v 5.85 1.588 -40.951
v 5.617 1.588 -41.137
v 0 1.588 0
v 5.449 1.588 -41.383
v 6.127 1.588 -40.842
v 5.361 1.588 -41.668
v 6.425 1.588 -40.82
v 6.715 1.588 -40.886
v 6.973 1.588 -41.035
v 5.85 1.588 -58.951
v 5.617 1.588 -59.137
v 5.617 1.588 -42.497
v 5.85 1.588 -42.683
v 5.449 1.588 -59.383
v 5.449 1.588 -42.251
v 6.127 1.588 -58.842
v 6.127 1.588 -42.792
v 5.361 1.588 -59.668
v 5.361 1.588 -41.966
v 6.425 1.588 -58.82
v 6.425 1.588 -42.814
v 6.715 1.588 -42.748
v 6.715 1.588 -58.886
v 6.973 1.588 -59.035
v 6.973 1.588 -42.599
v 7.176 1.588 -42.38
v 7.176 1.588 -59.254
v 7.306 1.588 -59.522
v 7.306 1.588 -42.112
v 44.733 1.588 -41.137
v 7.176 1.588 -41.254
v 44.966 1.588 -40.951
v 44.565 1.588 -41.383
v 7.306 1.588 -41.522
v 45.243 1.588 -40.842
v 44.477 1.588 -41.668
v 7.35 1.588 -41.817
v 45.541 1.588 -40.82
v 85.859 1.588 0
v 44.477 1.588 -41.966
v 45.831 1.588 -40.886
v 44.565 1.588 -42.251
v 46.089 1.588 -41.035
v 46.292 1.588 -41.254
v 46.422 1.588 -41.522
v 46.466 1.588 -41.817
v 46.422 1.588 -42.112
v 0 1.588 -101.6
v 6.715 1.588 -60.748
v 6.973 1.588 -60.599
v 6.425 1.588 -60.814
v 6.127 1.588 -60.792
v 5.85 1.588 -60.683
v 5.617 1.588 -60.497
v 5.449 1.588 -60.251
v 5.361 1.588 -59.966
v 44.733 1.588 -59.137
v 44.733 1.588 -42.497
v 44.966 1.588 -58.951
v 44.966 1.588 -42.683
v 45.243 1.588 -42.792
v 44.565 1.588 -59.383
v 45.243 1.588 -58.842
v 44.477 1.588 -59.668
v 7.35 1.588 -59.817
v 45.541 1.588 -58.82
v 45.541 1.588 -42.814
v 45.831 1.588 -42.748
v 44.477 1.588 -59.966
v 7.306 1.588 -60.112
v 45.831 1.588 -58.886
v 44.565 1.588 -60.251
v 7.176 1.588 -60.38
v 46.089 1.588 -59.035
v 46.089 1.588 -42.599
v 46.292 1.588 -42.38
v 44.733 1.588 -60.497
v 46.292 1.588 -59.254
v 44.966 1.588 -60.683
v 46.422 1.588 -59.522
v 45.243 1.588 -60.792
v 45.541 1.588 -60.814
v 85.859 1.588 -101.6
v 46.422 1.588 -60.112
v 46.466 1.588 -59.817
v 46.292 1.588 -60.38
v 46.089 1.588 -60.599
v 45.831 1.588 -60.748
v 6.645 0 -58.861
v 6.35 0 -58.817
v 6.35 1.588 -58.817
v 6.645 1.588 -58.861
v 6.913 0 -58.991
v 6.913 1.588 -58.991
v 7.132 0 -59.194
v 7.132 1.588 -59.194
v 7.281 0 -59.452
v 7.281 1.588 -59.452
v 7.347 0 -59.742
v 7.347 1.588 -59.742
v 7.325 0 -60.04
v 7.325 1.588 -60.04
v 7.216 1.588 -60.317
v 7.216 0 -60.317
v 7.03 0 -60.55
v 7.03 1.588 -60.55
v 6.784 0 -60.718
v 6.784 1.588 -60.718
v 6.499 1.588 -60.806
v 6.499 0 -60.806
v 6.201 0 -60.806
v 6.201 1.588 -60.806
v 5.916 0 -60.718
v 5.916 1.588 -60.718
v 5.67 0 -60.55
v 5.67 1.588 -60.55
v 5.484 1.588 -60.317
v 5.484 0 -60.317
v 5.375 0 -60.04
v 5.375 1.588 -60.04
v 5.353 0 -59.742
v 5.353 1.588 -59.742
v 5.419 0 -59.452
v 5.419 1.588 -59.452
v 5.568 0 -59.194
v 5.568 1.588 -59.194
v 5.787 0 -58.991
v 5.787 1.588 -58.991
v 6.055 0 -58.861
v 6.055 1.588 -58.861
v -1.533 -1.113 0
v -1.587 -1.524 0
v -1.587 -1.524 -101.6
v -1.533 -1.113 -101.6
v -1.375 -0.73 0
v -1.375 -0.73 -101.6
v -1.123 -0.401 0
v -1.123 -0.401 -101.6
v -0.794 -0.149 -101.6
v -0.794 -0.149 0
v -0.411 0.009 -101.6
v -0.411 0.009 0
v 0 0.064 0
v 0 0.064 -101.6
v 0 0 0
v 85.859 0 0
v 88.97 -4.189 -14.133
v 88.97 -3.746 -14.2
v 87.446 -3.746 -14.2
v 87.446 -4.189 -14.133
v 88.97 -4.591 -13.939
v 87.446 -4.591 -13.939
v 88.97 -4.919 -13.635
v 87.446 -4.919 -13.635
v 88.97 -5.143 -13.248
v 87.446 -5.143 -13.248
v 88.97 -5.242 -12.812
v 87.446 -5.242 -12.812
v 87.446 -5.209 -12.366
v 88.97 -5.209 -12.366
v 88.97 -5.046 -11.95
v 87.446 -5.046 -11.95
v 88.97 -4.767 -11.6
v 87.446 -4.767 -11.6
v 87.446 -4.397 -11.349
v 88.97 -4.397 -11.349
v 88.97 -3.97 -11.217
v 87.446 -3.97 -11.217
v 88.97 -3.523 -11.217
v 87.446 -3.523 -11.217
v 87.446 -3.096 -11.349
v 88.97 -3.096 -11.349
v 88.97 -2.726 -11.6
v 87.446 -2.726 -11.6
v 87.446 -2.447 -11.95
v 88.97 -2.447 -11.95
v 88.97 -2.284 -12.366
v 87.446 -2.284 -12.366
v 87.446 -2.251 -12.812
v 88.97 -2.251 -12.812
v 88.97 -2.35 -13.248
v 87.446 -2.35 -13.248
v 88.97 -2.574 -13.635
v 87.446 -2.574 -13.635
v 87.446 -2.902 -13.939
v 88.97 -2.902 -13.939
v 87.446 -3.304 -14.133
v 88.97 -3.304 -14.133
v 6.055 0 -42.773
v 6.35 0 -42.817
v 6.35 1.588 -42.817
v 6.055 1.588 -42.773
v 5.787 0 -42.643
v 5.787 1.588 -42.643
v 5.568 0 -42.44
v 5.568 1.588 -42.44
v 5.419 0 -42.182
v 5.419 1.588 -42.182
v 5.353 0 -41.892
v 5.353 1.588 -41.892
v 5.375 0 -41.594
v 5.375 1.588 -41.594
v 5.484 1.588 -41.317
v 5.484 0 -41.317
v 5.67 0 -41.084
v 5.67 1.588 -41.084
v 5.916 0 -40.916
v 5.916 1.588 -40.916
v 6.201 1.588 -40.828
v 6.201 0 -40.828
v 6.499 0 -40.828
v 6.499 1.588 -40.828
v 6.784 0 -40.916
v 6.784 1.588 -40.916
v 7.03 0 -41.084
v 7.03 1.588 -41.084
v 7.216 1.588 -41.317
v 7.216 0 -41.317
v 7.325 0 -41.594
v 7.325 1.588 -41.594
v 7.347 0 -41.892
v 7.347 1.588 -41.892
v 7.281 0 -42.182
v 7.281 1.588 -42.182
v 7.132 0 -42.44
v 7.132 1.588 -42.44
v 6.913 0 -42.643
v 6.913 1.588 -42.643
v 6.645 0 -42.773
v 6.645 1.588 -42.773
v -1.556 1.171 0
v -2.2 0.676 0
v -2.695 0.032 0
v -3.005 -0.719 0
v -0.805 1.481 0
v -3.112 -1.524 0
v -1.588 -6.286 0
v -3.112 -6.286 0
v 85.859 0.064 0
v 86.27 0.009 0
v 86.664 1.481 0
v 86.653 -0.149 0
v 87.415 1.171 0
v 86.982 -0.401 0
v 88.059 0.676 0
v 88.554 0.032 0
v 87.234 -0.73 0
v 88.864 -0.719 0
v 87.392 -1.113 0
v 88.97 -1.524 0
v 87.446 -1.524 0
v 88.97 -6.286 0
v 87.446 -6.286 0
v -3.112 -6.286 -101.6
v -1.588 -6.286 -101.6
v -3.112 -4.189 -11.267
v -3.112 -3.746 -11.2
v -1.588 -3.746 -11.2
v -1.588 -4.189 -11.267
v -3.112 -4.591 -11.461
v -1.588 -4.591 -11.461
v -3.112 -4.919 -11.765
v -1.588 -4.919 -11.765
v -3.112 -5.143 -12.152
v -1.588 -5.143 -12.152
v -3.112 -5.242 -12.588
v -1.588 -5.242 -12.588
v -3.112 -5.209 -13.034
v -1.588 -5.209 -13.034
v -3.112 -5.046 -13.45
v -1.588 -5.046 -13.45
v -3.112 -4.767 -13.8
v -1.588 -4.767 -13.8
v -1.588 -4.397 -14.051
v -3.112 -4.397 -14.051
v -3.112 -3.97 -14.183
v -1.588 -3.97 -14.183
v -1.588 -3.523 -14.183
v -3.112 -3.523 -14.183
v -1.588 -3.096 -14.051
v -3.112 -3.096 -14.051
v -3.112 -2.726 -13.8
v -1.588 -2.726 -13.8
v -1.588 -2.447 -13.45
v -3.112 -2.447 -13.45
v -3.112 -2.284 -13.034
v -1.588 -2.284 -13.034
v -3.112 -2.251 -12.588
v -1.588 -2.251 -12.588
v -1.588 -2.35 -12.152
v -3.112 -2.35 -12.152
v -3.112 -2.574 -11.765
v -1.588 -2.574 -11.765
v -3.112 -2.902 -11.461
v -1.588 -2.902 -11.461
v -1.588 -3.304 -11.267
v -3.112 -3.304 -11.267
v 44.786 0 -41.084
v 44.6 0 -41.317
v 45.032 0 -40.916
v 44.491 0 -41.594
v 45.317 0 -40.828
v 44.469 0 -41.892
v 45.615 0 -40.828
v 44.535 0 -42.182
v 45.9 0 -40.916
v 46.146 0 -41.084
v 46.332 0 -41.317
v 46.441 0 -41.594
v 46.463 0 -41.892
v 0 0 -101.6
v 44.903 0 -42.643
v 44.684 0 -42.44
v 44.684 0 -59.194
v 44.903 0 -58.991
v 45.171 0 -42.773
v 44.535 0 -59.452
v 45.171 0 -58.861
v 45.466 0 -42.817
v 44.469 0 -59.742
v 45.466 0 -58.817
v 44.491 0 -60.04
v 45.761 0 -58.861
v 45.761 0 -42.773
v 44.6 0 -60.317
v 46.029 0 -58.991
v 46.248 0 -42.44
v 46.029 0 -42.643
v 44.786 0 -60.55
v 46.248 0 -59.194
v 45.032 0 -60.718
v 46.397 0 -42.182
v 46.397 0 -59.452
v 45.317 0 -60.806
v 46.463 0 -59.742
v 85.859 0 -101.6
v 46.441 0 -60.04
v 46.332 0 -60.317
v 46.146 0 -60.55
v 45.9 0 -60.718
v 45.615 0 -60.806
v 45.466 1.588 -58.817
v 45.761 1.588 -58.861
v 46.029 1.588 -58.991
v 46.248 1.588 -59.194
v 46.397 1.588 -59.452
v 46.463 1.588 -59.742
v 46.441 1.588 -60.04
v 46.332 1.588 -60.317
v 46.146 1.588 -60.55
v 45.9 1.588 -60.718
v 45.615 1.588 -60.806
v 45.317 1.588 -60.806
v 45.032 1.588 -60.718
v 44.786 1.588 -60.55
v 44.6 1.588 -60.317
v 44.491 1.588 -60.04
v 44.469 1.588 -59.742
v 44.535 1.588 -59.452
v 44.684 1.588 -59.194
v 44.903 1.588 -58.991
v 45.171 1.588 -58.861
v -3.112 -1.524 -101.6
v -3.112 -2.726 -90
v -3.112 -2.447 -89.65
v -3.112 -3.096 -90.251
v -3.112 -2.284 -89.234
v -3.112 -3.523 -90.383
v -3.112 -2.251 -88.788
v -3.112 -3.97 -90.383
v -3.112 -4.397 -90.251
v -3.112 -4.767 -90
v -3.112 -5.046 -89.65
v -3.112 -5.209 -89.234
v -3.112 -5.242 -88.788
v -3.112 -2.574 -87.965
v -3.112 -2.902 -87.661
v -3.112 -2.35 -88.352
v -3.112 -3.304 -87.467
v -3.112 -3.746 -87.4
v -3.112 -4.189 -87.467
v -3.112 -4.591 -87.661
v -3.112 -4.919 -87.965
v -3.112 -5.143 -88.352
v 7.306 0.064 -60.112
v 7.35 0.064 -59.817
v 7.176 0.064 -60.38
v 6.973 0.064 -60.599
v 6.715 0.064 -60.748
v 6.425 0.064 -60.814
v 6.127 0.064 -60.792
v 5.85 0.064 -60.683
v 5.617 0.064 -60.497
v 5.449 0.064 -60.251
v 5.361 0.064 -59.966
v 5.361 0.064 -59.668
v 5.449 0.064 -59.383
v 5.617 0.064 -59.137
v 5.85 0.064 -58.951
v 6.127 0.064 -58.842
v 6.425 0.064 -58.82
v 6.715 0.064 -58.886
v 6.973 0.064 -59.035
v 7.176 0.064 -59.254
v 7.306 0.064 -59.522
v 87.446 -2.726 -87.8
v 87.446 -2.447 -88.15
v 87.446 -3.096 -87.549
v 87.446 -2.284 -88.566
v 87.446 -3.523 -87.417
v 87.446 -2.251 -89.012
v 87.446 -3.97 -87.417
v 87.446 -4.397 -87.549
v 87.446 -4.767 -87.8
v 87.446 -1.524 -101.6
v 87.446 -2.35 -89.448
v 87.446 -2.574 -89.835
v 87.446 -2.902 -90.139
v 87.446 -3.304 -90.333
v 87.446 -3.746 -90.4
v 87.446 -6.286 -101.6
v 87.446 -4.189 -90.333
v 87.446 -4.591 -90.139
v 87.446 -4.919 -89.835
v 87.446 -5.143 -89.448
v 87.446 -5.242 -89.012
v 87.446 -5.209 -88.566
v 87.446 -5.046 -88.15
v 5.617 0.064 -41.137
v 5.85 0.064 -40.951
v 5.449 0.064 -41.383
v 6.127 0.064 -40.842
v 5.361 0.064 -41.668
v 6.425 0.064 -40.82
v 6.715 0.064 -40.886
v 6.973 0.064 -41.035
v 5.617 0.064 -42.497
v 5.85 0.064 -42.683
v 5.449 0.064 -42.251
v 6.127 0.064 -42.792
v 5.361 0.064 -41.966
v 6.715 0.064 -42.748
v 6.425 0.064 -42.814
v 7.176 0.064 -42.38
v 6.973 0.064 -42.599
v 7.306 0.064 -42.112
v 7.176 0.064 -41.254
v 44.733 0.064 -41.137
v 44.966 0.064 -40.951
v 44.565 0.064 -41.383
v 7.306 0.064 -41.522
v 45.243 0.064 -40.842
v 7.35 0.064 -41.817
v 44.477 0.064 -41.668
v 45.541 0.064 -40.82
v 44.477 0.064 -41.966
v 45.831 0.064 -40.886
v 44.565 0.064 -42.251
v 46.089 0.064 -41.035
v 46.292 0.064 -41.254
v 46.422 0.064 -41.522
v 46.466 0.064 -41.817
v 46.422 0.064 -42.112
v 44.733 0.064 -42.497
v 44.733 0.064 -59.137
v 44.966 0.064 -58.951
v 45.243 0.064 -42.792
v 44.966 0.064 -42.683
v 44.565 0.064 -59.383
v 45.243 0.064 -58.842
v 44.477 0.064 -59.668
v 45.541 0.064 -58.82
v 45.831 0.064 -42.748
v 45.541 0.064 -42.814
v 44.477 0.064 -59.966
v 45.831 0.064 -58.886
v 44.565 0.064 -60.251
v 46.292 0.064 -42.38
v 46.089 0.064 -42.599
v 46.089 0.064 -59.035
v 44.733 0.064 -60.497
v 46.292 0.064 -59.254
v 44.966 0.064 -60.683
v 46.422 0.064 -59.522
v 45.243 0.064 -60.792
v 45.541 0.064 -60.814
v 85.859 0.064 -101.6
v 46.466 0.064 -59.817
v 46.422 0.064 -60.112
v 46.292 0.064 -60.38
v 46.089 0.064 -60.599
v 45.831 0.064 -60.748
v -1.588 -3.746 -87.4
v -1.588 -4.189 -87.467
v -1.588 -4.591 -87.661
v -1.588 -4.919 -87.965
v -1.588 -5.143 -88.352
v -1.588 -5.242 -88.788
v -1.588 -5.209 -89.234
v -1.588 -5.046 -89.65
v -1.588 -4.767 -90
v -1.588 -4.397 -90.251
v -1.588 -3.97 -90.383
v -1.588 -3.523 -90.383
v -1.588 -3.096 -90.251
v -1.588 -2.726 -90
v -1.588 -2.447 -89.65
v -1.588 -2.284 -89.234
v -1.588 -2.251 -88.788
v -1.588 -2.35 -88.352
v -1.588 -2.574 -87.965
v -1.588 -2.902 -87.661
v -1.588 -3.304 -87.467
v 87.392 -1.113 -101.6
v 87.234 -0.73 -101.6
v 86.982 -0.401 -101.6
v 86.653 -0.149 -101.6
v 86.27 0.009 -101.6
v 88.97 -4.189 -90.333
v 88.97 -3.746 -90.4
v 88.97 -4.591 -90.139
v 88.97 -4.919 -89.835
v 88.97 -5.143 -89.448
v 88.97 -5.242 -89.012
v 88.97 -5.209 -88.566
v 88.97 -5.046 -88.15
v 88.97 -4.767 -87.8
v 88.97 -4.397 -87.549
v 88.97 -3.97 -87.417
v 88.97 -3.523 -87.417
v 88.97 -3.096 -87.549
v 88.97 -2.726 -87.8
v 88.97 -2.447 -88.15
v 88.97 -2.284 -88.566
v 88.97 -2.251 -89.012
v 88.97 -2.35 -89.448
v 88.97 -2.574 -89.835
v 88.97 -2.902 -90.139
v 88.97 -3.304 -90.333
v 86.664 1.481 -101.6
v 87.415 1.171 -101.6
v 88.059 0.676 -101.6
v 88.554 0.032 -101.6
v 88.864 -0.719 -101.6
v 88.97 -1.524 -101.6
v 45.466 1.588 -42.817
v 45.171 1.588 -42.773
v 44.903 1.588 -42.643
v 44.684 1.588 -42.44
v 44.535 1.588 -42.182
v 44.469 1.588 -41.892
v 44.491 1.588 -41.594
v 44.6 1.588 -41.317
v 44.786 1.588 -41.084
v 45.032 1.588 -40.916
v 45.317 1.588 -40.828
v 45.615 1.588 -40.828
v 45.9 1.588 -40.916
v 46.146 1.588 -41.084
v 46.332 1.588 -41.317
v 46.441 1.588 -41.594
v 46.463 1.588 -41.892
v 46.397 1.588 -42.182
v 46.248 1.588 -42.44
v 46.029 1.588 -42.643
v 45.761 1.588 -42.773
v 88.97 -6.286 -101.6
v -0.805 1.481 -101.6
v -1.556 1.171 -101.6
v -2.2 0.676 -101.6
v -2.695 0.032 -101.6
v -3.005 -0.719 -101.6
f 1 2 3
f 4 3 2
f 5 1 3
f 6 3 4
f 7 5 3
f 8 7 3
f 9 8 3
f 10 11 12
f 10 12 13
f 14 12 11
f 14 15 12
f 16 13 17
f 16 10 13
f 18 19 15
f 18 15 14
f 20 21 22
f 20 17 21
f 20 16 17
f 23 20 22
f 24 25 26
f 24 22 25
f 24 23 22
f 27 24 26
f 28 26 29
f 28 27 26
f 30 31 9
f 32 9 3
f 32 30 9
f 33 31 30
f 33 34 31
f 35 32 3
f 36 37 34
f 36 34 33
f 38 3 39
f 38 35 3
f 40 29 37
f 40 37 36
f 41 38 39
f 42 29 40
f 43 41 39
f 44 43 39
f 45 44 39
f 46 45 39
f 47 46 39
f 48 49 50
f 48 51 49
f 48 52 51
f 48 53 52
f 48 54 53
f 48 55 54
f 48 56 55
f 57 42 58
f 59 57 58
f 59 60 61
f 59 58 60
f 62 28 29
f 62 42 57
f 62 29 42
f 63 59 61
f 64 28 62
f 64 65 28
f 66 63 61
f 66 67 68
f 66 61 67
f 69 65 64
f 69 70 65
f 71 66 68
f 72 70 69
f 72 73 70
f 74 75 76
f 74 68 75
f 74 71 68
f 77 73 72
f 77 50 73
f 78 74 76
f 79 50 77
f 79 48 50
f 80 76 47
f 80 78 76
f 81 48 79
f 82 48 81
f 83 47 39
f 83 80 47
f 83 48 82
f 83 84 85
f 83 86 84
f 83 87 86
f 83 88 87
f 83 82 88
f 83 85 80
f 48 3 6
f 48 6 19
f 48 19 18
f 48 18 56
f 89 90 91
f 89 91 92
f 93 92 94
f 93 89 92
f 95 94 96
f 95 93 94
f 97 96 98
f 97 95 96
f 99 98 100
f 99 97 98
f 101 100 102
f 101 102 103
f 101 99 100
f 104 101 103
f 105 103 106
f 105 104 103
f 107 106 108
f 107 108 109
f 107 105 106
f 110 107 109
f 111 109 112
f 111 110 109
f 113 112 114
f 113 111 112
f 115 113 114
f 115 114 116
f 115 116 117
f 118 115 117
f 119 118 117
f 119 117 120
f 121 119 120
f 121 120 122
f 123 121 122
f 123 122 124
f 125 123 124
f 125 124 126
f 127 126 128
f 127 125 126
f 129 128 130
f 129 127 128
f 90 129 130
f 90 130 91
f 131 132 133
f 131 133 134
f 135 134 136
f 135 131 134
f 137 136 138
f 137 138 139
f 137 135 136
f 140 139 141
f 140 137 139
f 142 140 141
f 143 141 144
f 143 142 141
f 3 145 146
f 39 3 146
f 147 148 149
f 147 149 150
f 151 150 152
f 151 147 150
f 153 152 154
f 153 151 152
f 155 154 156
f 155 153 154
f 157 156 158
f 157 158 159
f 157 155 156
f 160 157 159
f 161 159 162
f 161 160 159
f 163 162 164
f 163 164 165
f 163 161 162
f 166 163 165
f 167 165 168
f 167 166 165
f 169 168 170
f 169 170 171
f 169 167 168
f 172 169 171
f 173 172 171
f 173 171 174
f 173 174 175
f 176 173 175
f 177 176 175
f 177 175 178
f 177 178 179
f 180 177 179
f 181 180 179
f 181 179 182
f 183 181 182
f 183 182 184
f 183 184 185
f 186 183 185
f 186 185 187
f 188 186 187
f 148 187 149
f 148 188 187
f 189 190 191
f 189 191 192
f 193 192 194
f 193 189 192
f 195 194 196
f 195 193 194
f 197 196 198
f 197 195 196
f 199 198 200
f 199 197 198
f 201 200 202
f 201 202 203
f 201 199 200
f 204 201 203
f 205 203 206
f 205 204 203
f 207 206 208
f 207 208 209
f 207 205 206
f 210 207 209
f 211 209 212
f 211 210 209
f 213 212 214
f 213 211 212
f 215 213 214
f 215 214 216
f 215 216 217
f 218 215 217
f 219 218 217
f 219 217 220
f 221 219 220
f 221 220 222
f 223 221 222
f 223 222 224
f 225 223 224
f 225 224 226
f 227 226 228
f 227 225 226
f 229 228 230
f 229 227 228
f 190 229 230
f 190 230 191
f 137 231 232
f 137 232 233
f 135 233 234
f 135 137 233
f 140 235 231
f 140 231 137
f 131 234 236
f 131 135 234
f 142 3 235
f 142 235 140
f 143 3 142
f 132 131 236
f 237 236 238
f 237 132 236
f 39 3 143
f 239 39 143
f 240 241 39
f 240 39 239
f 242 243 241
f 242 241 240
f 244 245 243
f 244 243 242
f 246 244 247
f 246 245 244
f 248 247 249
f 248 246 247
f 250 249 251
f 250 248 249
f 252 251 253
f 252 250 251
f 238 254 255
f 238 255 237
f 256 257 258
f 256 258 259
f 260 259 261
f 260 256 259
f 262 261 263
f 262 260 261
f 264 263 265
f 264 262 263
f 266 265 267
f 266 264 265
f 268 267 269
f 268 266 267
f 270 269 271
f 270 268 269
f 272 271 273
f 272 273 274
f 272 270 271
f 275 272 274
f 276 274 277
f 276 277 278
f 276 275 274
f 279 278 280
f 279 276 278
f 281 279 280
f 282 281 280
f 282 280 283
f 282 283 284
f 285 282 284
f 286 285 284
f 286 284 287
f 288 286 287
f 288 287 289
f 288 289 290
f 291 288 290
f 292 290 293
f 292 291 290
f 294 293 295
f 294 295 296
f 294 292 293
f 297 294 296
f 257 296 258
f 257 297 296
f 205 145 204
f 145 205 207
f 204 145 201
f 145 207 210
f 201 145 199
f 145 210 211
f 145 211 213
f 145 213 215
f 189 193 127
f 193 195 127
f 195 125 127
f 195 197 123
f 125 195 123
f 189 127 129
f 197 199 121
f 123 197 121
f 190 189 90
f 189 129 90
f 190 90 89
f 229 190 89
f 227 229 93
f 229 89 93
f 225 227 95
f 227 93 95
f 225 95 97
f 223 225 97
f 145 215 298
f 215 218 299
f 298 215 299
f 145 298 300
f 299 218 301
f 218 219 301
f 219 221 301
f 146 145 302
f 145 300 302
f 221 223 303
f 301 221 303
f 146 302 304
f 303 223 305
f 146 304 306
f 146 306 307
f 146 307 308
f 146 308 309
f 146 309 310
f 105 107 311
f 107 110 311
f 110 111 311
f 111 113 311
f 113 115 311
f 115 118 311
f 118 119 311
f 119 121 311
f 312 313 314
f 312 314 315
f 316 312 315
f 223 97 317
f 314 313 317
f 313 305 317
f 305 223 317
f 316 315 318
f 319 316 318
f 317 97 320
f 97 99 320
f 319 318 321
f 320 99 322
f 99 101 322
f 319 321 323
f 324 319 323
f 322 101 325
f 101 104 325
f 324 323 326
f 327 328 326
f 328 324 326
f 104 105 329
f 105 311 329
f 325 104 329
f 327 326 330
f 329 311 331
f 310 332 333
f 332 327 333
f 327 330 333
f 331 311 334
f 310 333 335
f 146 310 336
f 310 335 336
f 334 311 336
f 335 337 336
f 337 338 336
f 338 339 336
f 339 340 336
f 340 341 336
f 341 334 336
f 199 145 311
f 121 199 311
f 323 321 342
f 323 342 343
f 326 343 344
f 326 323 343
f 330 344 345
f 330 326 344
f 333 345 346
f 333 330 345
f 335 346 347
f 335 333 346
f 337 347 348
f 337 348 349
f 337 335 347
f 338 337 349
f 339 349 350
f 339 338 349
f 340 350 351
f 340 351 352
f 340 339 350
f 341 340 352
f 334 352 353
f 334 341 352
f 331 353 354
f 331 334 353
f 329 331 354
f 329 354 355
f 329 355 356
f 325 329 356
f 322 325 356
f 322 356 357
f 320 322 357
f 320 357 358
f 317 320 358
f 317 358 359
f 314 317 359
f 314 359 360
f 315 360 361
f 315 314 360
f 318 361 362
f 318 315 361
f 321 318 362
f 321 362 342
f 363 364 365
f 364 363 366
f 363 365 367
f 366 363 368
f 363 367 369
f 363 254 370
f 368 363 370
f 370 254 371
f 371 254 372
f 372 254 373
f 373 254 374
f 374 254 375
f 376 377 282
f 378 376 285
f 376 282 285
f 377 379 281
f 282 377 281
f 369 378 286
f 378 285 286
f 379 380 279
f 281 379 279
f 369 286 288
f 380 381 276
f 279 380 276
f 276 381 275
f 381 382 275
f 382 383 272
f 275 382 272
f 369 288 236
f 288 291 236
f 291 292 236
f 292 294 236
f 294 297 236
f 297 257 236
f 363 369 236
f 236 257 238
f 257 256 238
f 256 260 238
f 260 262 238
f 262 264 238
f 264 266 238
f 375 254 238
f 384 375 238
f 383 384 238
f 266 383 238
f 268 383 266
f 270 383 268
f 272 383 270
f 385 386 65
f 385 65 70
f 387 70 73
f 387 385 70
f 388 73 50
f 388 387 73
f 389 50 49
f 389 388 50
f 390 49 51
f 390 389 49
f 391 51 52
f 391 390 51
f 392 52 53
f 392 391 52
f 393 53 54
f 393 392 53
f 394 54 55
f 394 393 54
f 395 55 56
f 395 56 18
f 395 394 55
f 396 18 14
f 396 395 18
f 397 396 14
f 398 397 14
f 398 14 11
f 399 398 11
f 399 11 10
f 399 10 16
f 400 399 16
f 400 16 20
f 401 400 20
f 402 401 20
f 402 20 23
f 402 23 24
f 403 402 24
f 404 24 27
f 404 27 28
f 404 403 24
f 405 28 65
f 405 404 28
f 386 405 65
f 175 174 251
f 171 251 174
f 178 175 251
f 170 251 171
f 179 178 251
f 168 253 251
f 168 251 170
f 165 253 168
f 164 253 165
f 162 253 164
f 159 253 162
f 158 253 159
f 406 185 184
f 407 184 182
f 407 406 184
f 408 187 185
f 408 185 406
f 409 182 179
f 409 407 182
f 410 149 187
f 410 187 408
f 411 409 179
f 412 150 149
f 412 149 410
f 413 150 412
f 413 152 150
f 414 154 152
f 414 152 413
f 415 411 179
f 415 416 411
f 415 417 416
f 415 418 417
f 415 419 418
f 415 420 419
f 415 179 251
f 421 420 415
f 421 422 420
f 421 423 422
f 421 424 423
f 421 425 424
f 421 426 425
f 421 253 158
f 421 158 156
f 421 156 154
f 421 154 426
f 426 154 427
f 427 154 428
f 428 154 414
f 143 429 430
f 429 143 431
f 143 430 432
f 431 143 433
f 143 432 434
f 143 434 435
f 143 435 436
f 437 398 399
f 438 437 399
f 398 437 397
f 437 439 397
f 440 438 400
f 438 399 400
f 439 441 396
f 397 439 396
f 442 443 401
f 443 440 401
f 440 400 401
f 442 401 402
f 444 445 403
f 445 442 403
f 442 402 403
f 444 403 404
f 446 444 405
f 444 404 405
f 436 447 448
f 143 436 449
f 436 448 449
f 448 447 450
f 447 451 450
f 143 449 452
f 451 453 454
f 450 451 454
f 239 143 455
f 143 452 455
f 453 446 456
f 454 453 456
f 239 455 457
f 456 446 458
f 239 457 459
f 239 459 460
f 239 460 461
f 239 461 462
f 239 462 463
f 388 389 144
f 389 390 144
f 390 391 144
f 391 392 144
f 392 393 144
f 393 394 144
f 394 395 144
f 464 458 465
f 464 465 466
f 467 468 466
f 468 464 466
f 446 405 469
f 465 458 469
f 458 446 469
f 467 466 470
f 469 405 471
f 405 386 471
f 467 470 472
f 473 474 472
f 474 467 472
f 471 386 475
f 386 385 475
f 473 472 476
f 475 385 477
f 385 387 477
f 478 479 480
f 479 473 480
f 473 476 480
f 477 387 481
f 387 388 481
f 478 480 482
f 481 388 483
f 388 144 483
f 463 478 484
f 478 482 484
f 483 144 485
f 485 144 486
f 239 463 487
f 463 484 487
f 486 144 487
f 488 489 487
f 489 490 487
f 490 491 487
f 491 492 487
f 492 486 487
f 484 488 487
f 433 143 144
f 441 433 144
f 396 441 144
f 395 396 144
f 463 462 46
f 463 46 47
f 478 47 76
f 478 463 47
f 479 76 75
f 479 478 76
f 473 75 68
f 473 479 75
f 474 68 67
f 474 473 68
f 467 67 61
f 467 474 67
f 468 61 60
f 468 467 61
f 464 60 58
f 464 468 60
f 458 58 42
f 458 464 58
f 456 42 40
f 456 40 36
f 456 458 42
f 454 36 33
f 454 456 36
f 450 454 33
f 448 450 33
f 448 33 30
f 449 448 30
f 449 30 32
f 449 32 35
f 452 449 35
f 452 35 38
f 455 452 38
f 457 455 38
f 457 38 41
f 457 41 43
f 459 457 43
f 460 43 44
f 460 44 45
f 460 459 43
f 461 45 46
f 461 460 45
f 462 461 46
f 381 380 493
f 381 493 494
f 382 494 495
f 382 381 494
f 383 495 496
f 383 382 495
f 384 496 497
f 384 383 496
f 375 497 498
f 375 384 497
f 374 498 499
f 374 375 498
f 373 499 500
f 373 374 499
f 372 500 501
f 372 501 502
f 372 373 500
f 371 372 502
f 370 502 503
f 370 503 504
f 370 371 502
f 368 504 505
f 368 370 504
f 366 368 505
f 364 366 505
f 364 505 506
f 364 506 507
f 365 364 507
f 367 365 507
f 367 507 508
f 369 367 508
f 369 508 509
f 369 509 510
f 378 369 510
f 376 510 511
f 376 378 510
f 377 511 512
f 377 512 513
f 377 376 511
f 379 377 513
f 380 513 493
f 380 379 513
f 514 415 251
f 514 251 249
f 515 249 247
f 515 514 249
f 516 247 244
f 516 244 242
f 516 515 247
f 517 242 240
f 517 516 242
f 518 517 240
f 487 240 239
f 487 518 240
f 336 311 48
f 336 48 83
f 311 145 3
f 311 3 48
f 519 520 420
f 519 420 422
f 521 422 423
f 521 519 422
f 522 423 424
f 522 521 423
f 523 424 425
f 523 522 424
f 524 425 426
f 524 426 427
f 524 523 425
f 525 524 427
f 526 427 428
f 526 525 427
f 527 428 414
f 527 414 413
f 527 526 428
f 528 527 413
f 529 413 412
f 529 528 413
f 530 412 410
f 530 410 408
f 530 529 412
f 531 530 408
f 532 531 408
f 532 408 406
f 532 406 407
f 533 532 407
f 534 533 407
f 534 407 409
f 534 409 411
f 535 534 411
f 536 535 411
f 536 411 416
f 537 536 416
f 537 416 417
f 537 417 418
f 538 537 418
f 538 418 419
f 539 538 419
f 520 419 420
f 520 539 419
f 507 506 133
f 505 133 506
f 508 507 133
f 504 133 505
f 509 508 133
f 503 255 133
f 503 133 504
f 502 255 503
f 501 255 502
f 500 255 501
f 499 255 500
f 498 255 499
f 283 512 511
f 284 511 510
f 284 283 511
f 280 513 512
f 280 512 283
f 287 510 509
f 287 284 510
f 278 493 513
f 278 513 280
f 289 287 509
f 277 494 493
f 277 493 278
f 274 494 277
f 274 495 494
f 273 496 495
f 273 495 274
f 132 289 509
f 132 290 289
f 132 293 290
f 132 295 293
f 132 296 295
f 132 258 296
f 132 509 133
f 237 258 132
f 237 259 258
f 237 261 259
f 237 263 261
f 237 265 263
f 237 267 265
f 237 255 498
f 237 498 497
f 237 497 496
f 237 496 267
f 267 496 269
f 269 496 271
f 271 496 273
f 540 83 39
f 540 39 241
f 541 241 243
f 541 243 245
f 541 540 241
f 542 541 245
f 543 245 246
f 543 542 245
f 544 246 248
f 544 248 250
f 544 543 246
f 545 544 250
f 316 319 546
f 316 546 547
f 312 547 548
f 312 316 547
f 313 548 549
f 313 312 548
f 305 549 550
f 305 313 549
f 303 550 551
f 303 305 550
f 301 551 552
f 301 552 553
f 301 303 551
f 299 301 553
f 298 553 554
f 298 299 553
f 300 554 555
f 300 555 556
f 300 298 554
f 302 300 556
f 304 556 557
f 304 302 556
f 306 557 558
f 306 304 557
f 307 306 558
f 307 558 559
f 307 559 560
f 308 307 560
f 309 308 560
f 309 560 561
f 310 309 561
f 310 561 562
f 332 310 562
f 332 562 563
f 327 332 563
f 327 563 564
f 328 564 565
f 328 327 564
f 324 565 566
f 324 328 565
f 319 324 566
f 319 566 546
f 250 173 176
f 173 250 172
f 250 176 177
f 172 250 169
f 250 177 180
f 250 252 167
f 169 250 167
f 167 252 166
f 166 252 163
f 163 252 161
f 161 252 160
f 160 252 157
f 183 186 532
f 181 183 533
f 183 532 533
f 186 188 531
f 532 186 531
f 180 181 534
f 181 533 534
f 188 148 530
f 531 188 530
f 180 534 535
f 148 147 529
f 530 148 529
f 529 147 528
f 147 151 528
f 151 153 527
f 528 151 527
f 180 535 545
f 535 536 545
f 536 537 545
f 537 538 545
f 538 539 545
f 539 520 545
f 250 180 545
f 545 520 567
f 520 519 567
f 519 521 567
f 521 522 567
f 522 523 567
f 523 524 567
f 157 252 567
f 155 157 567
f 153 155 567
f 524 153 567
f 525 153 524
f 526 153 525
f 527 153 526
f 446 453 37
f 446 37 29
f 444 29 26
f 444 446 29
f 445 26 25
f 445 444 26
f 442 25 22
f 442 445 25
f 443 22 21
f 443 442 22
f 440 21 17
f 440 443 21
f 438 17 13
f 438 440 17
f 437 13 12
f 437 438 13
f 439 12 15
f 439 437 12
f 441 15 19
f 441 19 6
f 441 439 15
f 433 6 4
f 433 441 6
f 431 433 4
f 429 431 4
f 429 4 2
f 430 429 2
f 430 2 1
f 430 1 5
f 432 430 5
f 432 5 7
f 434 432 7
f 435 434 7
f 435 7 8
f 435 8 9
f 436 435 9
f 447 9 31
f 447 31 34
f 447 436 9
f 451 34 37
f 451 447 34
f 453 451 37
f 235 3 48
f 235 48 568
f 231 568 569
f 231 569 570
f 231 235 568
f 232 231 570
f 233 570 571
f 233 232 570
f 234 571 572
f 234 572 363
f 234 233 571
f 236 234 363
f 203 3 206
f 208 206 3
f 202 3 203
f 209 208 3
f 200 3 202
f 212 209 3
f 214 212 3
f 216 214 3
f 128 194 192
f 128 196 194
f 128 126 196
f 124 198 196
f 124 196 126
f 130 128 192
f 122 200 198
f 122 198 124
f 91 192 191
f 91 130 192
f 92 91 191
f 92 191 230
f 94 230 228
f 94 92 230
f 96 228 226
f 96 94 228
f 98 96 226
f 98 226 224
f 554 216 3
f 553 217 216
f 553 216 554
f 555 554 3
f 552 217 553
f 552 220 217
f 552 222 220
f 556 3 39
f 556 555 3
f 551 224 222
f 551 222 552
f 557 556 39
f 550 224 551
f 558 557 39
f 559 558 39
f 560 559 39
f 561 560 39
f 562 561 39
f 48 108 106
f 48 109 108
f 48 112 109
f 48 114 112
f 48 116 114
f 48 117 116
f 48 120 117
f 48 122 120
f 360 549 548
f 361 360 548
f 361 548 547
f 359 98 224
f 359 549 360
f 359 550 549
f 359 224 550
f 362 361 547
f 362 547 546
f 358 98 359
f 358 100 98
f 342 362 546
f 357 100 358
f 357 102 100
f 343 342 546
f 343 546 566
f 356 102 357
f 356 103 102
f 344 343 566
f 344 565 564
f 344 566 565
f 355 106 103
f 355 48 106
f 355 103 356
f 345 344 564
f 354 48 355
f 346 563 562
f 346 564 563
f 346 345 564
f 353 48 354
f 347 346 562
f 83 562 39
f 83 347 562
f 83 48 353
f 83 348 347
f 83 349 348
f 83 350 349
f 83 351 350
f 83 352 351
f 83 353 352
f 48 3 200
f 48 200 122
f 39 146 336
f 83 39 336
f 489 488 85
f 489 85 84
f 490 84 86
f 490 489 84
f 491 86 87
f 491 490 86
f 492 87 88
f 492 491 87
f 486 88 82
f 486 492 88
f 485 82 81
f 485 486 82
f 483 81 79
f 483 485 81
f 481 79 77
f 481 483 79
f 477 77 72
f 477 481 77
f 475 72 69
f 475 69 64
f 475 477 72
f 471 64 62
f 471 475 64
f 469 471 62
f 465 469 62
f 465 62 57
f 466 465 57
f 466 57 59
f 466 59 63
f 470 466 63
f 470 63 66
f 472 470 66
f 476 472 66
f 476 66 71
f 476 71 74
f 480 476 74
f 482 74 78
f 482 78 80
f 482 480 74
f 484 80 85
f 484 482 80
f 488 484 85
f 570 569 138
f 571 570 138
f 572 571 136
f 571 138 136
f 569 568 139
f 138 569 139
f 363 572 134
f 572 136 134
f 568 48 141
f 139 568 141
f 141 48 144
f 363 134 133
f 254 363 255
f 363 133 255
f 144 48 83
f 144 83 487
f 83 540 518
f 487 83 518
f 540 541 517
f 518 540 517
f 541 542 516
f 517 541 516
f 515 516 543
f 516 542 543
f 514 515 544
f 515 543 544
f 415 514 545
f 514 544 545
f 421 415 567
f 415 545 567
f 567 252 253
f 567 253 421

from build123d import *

# Parameters (mm, degrees)
ESQUISSE1_W                      = 85.859
ESQUISSE1_H                      = 101.6
ESQUISSE1_R                      = 1
BOSS_EXTRU_1_DEPTH               = 1.5875
CONVERTIR_VOLUME1_START          = 0.0635
CONVERTIR_VOLUME1_OUTLINE_W      = 85.859
CONVERTIR_VOLUME1_OUTLINE_H      = 101.6
CONVERTIR_VOLUME1_OUTLINE_R      = 1
CONVERTIR_VOLUME1_DEPTH          = 1.524
T_LE_PLI_E_SUR_AR_TE1_DEPTH      = 101.6
T_LE_START                       = -1.524
T_LE_PLI_E_SUR_AR_TE1_PROFILE_W  = 101.6
T_LE_PLI_E_SUR_AR_TE1_PROFILE_H  = 4.7625
T_LE_PLI_E_SUR_AR_TE1_PROFILE_R  = 1.5
T_LE_PLI_E_SUR_AR_TE1_FLAT_DEPTH = 1.524
T_LE_PLI_E_SUR_AR_TE4_DEPTH      = 101.6
T_LE_PLI_E_SUR_AR_TE4_PROFILE_W  = 101.6
T_LE_PLI_E_SUR_AR_TE4_PROFILE_H  = 4.7625
T_LE_PLI_E_SUR_AR_TE4_PROFILE_R  = 1.5
T_LE_PLI_E_SUR_AR_TE4_FLAT_DEPTH = 1.524


# Read off the part's stored shape, not the designer's step: Convertir-Volume1
# Sheet-metal steps are written as plain solids
with BuildPart() as part:
    # Esquisse1 → Boss.-Extru.1 (new body)
    with BuildSketch(Plane(origin=(0, 0, 0), x_dir=(1, 0, 0), z_dir=(0, 1, 0))):
        with Locations((42.9295, 50.8)):
            Rectangle(ESQUISSE1_W, ESQUISSE1_H)
        with Locations(Location((6.35, 59.817, 0), (0, 0, 270))):
            Circle(ESQUISSE1_R, mode=Mode.SUBTRACT)
        with Locations(Location((45.466, 59.817, 0), (0, 0, 270))):
            Circle(ESQUISSE1_R, mode=Mode.SUBTRACT)
        with Locations(Location((45.466, 41.817, 0), (0, 0, 90))):
            Circle(ESQUISSE1_R, mode=Mode.SUBTRACT)
        with Locations(Location((6.35, 41.817, 0), (0, 0, 90))):
            Circle(ESQUISSE1_R, mode=Mode.SUBTRACT)
    extrude(amount=BOSS_EXTRU_1_DEPTH)


with BuildPart() as body_2:
    # Convertir-Volume1 outline → Convertir-Volume1 (new body)
    with BuildSketch(Plane(origin=(0, 0, 0), x_dir=(1, 0, 0), z_dir=(0, 1, 0)).offset(CONVERTIR_VOLUME1_START)):
        with Locations((42.9295, 50.8)):
            Rectangle(CONVERTIR_VOLUME1_OUTLINE_W, CONVERTIR_VOLUME1_OUTLINE_H)
        with Locations((6.35, 41.817)):
            Circle(CONVERTIR_VOLUME1_OUTLINE_R, mode=Mode.SUBTRACT)
        with Locations((45.466, 41.817)):
            Circle(CONVERTIR_VOLUME1_OUTLINE_R, mode=Mode.SUBTRACT)
        with Locations((6.35, 59.817)):
            Circle(CONVERTIR_VOLUME1_OUTLINE_R, mode=Mode.SUBTRACT)
        with Locations((45.466, 59.817)):
            Circle(CONVERTIR_VOLUME1_OUTLINE_R, mode=Mode.SUBTRACT)
    extrude(amount=CONVERTIR_VOLUME1_DEPTH)

    # Tôle pliée sur arête1 bend section (across the edge) → Tôle pliée sur arête1 (add)
    with BuildSketch(Plane(origin=(-1.5875, 0.0635, 0), x_dir=(1, 0, 0), z_dir=(0, 0, -1))):
        with BuildLine():
            Line((-1.524, 1.5875), (0, 1.5875))
            ThreePointArc((0, 1.5875), (0.464967985, 0.464967985), (1.5875, 0))
            Line((1.5875, 0), (1.5875, -1.524))
            ThreePointArc((1.5875, -1.524), (-0.61266275, -0.61266275), (-1.524, 1.5875))
        make_face()
    extrude(amount=T_LE_PLI_E_SUR_AR_TE1_DEPTH)

    # Tôle pliée sur arête1 profile (on flange) → Tôle pliée sur arête1 flat (add)
    with BuildSketch(Plane(origin=(-1.5875, 0.0635, 0), x_dir=(0, 0, 1), z_dir=(1, 0, 0)).offset(T_LE_START)):
        with Locations((-50.8, 3.96875)):
            Rectangle(T_LE_PLI_E_SUR_AR_TE1_PROFILE_W, T_LE_PLI_E_SUR_AR_TE1_PROFILE_H)
        with Locations((-12.7, 3.81)):
            Circle(T_LE_PLI_E_SUR_AR_TE1_PROFILE_R, mode=Mode.SUBTRACT)
        with Locations((-88.9, 3.81)):
            Circle(T_LE_PLI_E_SUR_AR_TE1_PROFILE_R, mode=Mode.SUBTRACT)
    extrude(amount=T_LE_PLI_E_SUR_AR_TE1_FLAT_DEPTH)

    # Tôle pliée sur arête4 bend section (across the edge) → Tôle pliée sur arête4 (add)
    with BuildSketch(Plane(origin=(87.4465, 0.0635, -101.6), x_dir=(-1, 0, 0), z_dir=(0, 0, 1))):
        with BuildLine():
            Line((-1.524, 1.5875), (0, 1.5875))
            ThreePointArc((0, 1.5875), (0.464967985, 0.464967985), (1.5875, 0))
            Line((1.5875, 0), (1.5875, -1.524))
            ThreePointArc((1.5875, -1.524), (-0.61266275, -0.61266275), (-1.524, 1.5875))
        make_face()
    extrude(amount=T_LE_PLI_E_SUR_AR_TE4_DEPTH)

    # Tôle pliée sur arête4 profile (on flange) → Tôle pliée sur arête4 flat (add)
    with BuildSketch(Plane(origin=(87.4465, 0.0635, 0), x_dir=(0, 0, -1), z_dir=(-1, 0, 0)).offset(T_LE_START)):
        with Locations((50.8, 3.96875)):
            Rectangle(T_LE_PLI_E_SUR_AR_TE4_PROFILE_W, T_LE_PLI_E_SUR_AR_TE4_PROFILE_H)
        with Locations((12.7, 3.81)):
            Circle(T_LE_PLI_E_SUR_AR_TE4_PROFILE_R, mode=Mode.SUBTRACT)
        with Locations((88.9, 3.81)):
            Circle(T_LE_PLI_E_SUR_AR_TE4_PROFILE_R, mode=Mode.SUBTRACT)
    extrude(amount=T_LE_PLI_E_SUR_AR_TE4_FLAT_DEPTH)


solid = Compound([part.part, body_2.part])
